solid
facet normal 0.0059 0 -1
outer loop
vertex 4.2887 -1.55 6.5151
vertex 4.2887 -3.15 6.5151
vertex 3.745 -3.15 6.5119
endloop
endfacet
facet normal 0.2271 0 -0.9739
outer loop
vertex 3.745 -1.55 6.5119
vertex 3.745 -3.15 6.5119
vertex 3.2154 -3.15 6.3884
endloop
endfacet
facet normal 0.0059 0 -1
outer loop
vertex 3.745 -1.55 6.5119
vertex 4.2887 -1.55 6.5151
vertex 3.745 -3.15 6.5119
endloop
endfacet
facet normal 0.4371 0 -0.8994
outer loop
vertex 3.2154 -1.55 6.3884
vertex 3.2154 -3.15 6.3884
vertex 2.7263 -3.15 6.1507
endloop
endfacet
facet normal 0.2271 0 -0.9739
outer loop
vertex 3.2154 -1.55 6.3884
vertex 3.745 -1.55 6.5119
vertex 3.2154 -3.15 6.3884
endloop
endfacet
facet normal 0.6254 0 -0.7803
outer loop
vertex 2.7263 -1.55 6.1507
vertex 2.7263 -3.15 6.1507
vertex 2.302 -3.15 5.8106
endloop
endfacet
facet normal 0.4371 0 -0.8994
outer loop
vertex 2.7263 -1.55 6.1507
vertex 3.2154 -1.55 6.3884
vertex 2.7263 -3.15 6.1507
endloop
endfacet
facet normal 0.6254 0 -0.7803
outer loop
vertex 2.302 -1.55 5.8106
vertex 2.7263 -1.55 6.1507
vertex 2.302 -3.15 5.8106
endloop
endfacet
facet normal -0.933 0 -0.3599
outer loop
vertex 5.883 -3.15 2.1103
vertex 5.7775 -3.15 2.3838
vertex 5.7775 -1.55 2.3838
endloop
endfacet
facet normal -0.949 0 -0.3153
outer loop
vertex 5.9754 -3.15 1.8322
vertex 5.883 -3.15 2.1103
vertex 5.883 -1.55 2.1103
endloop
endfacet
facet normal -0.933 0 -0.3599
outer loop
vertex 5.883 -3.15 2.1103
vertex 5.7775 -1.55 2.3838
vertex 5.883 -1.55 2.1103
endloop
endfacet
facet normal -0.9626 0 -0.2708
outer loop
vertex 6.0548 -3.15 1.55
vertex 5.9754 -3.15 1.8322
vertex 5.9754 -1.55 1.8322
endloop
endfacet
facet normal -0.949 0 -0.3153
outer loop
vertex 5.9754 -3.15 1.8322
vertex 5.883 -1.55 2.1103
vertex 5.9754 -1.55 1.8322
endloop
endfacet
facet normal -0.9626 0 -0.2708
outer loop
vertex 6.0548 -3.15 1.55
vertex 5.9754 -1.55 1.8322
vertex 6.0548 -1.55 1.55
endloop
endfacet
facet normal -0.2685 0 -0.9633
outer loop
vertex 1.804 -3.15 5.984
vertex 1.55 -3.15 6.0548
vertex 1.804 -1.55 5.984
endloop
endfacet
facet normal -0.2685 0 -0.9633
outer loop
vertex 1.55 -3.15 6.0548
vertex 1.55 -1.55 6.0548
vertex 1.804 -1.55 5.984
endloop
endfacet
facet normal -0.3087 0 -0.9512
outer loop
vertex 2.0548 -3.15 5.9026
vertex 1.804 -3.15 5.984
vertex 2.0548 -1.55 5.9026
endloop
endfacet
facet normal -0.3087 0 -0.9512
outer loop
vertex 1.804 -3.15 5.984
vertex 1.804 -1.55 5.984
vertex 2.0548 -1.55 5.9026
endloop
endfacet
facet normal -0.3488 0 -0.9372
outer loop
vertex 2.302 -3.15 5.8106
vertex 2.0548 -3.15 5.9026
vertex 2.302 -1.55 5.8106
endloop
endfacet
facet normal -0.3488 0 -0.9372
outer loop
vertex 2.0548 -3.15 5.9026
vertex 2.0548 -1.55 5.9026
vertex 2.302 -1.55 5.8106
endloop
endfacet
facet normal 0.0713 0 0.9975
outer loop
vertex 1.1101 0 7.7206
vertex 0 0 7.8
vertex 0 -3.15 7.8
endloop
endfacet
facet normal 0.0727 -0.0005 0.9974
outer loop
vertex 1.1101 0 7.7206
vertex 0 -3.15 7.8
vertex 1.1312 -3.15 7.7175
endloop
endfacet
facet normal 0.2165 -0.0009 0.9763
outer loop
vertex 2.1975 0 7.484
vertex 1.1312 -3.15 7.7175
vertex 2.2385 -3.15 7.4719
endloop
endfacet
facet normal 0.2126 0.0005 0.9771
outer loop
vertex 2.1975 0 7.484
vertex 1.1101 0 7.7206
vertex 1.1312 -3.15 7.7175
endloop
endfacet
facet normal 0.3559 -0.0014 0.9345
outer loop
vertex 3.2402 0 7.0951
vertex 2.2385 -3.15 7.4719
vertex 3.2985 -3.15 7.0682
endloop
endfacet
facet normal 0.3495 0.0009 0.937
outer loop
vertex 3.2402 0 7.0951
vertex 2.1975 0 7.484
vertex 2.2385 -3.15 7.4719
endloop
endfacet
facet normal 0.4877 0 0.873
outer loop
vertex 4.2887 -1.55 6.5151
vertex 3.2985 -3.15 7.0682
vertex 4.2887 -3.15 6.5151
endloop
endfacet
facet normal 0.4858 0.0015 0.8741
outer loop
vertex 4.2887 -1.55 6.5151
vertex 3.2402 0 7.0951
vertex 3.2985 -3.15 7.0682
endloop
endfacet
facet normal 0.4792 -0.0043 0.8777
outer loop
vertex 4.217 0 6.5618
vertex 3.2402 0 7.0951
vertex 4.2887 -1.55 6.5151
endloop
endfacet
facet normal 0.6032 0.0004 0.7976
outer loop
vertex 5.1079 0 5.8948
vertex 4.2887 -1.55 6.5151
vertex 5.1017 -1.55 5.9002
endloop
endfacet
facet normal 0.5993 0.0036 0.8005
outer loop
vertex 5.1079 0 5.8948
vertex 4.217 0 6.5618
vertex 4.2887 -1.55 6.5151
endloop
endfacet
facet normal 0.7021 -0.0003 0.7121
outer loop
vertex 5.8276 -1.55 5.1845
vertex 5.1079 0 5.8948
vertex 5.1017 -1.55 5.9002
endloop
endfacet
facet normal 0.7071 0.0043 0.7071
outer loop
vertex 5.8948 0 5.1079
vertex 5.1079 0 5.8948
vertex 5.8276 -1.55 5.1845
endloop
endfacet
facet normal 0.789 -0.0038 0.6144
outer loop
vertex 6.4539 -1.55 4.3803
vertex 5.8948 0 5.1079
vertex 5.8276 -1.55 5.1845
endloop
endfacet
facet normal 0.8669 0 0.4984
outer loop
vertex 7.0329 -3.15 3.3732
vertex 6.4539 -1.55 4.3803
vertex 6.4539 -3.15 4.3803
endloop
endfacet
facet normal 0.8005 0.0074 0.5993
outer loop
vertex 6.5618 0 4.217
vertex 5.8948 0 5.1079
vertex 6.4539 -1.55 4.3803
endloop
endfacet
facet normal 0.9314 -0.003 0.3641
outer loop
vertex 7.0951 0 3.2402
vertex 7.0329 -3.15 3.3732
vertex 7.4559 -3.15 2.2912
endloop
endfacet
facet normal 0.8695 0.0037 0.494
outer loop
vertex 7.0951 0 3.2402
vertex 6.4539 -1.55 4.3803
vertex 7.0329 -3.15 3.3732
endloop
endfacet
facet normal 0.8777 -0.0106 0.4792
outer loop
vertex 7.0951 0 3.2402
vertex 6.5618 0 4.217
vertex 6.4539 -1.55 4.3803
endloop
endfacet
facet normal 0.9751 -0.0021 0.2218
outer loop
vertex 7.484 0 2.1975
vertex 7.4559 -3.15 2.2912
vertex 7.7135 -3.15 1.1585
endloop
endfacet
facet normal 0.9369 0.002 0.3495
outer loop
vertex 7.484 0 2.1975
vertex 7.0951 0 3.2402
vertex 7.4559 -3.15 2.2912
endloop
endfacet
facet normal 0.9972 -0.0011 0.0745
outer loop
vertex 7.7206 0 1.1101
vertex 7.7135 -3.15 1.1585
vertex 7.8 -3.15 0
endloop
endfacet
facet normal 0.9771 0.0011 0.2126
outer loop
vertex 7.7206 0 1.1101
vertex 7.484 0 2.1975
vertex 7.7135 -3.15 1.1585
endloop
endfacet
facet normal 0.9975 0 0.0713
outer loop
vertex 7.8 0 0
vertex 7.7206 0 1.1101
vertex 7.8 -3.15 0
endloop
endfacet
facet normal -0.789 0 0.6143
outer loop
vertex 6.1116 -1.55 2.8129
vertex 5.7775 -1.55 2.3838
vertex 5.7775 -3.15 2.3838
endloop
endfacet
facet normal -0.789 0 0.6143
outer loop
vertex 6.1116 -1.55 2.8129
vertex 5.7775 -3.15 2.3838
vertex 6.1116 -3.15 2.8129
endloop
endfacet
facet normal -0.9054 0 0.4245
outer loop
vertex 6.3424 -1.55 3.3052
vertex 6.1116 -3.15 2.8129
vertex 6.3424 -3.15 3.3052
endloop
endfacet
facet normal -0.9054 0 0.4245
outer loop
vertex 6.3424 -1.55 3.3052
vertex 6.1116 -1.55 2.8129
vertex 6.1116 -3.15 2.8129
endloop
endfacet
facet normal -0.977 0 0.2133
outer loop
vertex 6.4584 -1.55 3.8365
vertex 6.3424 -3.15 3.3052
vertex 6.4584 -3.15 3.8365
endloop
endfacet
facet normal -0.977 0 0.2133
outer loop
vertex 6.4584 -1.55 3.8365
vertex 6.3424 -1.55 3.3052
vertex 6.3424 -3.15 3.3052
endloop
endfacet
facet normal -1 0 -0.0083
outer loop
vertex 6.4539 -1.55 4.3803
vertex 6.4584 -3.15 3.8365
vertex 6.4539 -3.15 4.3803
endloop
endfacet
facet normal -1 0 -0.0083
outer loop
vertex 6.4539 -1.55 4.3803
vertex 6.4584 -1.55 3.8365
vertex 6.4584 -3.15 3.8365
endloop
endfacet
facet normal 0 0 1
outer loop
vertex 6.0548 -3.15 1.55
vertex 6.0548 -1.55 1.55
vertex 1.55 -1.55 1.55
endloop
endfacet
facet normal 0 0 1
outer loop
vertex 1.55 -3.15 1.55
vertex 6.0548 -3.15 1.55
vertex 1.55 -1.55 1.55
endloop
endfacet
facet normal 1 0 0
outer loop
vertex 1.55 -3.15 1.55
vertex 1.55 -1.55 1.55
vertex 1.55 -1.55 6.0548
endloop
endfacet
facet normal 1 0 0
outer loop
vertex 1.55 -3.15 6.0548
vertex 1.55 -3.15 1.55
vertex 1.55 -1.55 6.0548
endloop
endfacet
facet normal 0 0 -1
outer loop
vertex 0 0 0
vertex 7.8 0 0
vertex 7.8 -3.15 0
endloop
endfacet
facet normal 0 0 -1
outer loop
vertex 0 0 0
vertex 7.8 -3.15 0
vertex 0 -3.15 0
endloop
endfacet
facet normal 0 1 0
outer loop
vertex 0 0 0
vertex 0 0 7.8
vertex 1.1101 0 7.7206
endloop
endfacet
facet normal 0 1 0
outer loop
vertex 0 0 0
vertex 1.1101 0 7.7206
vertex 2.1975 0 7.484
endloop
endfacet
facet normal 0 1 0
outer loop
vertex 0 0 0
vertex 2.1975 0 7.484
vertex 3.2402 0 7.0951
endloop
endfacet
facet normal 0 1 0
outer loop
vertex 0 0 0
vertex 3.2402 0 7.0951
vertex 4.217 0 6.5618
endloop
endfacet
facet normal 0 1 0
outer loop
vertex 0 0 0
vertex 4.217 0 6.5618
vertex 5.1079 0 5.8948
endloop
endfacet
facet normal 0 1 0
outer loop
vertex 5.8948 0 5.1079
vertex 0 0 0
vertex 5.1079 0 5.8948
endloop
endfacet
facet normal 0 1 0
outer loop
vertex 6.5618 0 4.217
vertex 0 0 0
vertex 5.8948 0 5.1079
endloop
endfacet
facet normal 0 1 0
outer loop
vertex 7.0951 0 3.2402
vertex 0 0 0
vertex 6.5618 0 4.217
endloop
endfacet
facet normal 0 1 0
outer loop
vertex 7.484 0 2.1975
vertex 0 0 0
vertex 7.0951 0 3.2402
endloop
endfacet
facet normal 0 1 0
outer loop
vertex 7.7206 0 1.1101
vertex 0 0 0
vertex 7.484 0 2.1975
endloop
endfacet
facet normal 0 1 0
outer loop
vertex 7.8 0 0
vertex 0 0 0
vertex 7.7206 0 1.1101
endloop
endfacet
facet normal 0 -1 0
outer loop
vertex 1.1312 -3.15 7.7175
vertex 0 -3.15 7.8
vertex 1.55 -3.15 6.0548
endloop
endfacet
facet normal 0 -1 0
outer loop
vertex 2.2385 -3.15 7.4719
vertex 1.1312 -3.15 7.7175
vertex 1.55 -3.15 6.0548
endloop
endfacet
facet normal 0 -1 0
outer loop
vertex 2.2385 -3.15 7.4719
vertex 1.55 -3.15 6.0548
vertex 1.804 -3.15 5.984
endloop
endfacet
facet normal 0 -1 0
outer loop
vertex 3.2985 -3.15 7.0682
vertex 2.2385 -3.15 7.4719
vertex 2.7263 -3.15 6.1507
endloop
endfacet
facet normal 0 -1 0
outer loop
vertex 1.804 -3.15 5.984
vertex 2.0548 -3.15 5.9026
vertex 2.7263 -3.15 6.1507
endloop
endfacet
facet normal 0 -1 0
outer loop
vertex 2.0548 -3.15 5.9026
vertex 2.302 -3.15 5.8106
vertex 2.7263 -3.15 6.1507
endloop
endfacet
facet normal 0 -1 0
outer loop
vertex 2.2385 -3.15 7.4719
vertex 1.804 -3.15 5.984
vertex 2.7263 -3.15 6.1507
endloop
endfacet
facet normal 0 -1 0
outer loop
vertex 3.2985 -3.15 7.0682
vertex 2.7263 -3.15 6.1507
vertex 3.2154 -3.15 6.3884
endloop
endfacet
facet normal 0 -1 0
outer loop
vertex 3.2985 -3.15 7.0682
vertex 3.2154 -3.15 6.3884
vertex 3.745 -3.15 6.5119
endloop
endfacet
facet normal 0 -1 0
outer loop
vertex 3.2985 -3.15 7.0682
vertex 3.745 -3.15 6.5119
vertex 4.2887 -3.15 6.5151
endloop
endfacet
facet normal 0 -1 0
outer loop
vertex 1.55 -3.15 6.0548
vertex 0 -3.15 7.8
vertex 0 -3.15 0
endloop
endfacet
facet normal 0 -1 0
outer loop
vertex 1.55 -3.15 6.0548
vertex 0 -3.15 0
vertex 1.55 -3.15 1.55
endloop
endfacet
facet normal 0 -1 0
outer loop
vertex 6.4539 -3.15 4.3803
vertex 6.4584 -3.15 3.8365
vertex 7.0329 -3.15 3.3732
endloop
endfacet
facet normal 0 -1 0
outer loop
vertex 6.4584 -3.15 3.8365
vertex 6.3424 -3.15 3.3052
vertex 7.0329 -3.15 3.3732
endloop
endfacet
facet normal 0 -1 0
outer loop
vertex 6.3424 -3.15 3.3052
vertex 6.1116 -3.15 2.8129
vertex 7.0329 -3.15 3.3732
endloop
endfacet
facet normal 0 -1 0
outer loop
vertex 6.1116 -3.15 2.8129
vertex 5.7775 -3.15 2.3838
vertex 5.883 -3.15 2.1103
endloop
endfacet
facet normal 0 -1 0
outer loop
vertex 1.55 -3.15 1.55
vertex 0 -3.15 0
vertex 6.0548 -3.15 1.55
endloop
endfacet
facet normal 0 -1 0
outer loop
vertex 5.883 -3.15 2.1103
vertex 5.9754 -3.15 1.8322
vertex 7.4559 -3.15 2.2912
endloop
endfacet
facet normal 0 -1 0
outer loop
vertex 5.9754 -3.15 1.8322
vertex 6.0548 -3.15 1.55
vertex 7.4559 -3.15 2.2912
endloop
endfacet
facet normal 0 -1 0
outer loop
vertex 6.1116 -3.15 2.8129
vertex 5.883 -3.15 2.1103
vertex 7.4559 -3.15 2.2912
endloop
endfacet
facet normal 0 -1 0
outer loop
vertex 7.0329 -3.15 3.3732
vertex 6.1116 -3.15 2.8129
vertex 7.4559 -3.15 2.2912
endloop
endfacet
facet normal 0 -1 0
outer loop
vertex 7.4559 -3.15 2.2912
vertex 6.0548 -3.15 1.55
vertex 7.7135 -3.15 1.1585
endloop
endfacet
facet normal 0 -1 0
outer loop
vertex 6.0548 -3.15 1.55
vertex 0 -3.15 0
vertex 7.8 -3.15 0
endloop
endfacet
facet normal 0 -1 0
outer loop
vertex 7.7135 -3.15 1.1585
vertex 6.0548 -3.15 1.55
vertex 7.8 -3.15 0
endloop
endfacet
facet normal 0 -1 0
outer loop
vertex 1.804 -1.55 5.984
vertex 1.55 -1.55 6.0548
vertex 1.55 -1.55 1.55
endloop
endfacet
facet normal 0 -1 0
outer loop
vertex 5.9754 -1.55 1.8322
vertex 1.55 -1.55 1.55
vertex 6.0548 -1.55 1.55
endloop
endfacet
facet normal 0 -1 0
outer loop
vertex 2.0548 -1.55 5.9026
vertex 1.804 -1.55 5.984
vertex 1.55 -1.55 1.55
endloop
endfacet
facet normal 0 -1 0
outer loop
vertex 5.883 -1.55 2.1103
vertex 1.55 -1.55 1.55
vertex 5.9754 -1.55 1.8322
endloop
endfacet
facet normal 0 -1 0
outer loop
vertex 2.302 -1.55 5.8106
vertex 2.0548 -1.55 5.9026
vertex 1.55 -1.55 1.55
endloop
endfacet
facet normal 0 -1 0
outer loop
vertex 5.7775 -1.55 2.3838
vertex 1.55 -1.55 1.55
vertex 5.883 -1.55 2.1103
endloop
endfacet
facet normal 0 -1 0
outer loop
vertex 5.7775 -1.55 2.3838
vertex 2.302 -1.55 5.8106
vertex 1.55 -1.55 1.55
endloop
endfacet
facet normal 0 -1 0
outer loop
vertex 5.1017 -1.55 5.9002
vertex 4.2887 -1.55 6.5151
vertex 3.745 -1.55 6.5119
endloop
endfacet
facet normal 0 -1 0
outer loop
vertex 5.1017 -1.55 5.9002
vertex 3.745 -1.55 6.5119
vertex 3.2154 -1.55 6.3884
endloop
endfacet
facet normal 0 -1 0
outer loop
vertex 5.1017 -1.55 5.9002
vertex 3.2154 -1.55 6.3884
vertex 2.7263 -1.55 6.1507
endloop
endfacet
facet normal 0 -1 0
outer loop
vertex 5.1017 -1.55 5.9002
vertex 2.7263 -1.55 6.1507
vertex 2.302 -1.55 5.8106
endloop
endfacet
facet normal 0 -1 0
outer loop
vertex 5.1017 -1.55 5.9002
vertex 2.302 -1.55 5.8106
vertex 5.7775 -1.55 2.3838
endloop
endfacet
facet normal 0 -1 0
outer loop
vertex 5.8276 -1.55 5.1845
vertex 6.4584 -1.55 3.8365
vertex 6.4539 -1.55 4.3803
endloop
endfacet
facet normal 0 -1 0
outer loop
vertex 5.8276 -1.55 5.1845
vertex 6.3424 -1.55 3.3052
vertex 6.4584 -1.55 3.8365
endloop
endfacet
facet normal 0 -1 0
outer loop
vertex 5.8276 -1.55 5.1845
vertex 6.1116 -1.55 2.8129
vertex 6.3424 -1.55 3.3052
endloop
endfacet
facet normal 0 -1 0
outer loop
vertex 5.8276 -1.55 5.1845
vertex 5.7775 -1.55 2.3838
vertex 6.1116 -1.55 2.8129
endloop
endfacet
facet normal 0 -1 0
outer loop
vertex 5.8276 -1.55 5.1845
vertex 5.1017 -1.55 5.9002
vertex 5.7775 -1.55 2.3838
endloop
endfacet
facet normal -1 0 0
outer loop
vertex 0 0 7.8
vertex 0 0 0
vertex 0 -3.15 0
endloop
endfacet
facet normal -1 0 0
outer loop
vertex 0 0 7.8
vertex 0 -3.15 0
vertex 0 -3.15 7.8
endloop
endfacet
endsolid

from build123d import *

# Parameters (mm, degrees)
BOSS_EXTRUDE1_DEPTH = 3.15
SHELL1_T            = -1.55
SKETCH2_R           = 2.440449026
CUT_EXTRUDE1_DEPTH  = 1.6


with BuildPart() as part:
    # Sketch1 → Boss-Extrude1 (new body)
    with BuildSketch(Plane(origin=(0, 0, 0), x_dir=(1, 0, 0), z_dir=(0, 1, 0))):
        with BuildLine():
            Line((0, 0), (0, -7.8))
            ThreePointArc((0, -7.8), (5.515432893, -5.515432893), (7.8, 0))
            Line((7.8, 0), (0, 0))
        make_face()
    extrude(amount=-BOSS_EXTRUDE1_DEPTH)

    # Shell1
    shell1_openings = [part.faces().sort_by_distance(p)[0] for p in [
        (3.310422816, -3.15, 3.310422816),
    ]]
    offset(amount=SHELL1_T, openings=shell1_openings, kind=Kind.INTERSECTION)

    # Sketch2 → Cut-Extrude1 (cut)
    with BuildSketch(Plane.XZ.offset(1.55)):
        with Locations((4.030998371, 4.088310158)):
            Circle(SKETCH2_R)
    extrude(amount=CUT_EXTRUDE1_DEPTH, mode=Mode.SUBTRACT)


solid = part.part
